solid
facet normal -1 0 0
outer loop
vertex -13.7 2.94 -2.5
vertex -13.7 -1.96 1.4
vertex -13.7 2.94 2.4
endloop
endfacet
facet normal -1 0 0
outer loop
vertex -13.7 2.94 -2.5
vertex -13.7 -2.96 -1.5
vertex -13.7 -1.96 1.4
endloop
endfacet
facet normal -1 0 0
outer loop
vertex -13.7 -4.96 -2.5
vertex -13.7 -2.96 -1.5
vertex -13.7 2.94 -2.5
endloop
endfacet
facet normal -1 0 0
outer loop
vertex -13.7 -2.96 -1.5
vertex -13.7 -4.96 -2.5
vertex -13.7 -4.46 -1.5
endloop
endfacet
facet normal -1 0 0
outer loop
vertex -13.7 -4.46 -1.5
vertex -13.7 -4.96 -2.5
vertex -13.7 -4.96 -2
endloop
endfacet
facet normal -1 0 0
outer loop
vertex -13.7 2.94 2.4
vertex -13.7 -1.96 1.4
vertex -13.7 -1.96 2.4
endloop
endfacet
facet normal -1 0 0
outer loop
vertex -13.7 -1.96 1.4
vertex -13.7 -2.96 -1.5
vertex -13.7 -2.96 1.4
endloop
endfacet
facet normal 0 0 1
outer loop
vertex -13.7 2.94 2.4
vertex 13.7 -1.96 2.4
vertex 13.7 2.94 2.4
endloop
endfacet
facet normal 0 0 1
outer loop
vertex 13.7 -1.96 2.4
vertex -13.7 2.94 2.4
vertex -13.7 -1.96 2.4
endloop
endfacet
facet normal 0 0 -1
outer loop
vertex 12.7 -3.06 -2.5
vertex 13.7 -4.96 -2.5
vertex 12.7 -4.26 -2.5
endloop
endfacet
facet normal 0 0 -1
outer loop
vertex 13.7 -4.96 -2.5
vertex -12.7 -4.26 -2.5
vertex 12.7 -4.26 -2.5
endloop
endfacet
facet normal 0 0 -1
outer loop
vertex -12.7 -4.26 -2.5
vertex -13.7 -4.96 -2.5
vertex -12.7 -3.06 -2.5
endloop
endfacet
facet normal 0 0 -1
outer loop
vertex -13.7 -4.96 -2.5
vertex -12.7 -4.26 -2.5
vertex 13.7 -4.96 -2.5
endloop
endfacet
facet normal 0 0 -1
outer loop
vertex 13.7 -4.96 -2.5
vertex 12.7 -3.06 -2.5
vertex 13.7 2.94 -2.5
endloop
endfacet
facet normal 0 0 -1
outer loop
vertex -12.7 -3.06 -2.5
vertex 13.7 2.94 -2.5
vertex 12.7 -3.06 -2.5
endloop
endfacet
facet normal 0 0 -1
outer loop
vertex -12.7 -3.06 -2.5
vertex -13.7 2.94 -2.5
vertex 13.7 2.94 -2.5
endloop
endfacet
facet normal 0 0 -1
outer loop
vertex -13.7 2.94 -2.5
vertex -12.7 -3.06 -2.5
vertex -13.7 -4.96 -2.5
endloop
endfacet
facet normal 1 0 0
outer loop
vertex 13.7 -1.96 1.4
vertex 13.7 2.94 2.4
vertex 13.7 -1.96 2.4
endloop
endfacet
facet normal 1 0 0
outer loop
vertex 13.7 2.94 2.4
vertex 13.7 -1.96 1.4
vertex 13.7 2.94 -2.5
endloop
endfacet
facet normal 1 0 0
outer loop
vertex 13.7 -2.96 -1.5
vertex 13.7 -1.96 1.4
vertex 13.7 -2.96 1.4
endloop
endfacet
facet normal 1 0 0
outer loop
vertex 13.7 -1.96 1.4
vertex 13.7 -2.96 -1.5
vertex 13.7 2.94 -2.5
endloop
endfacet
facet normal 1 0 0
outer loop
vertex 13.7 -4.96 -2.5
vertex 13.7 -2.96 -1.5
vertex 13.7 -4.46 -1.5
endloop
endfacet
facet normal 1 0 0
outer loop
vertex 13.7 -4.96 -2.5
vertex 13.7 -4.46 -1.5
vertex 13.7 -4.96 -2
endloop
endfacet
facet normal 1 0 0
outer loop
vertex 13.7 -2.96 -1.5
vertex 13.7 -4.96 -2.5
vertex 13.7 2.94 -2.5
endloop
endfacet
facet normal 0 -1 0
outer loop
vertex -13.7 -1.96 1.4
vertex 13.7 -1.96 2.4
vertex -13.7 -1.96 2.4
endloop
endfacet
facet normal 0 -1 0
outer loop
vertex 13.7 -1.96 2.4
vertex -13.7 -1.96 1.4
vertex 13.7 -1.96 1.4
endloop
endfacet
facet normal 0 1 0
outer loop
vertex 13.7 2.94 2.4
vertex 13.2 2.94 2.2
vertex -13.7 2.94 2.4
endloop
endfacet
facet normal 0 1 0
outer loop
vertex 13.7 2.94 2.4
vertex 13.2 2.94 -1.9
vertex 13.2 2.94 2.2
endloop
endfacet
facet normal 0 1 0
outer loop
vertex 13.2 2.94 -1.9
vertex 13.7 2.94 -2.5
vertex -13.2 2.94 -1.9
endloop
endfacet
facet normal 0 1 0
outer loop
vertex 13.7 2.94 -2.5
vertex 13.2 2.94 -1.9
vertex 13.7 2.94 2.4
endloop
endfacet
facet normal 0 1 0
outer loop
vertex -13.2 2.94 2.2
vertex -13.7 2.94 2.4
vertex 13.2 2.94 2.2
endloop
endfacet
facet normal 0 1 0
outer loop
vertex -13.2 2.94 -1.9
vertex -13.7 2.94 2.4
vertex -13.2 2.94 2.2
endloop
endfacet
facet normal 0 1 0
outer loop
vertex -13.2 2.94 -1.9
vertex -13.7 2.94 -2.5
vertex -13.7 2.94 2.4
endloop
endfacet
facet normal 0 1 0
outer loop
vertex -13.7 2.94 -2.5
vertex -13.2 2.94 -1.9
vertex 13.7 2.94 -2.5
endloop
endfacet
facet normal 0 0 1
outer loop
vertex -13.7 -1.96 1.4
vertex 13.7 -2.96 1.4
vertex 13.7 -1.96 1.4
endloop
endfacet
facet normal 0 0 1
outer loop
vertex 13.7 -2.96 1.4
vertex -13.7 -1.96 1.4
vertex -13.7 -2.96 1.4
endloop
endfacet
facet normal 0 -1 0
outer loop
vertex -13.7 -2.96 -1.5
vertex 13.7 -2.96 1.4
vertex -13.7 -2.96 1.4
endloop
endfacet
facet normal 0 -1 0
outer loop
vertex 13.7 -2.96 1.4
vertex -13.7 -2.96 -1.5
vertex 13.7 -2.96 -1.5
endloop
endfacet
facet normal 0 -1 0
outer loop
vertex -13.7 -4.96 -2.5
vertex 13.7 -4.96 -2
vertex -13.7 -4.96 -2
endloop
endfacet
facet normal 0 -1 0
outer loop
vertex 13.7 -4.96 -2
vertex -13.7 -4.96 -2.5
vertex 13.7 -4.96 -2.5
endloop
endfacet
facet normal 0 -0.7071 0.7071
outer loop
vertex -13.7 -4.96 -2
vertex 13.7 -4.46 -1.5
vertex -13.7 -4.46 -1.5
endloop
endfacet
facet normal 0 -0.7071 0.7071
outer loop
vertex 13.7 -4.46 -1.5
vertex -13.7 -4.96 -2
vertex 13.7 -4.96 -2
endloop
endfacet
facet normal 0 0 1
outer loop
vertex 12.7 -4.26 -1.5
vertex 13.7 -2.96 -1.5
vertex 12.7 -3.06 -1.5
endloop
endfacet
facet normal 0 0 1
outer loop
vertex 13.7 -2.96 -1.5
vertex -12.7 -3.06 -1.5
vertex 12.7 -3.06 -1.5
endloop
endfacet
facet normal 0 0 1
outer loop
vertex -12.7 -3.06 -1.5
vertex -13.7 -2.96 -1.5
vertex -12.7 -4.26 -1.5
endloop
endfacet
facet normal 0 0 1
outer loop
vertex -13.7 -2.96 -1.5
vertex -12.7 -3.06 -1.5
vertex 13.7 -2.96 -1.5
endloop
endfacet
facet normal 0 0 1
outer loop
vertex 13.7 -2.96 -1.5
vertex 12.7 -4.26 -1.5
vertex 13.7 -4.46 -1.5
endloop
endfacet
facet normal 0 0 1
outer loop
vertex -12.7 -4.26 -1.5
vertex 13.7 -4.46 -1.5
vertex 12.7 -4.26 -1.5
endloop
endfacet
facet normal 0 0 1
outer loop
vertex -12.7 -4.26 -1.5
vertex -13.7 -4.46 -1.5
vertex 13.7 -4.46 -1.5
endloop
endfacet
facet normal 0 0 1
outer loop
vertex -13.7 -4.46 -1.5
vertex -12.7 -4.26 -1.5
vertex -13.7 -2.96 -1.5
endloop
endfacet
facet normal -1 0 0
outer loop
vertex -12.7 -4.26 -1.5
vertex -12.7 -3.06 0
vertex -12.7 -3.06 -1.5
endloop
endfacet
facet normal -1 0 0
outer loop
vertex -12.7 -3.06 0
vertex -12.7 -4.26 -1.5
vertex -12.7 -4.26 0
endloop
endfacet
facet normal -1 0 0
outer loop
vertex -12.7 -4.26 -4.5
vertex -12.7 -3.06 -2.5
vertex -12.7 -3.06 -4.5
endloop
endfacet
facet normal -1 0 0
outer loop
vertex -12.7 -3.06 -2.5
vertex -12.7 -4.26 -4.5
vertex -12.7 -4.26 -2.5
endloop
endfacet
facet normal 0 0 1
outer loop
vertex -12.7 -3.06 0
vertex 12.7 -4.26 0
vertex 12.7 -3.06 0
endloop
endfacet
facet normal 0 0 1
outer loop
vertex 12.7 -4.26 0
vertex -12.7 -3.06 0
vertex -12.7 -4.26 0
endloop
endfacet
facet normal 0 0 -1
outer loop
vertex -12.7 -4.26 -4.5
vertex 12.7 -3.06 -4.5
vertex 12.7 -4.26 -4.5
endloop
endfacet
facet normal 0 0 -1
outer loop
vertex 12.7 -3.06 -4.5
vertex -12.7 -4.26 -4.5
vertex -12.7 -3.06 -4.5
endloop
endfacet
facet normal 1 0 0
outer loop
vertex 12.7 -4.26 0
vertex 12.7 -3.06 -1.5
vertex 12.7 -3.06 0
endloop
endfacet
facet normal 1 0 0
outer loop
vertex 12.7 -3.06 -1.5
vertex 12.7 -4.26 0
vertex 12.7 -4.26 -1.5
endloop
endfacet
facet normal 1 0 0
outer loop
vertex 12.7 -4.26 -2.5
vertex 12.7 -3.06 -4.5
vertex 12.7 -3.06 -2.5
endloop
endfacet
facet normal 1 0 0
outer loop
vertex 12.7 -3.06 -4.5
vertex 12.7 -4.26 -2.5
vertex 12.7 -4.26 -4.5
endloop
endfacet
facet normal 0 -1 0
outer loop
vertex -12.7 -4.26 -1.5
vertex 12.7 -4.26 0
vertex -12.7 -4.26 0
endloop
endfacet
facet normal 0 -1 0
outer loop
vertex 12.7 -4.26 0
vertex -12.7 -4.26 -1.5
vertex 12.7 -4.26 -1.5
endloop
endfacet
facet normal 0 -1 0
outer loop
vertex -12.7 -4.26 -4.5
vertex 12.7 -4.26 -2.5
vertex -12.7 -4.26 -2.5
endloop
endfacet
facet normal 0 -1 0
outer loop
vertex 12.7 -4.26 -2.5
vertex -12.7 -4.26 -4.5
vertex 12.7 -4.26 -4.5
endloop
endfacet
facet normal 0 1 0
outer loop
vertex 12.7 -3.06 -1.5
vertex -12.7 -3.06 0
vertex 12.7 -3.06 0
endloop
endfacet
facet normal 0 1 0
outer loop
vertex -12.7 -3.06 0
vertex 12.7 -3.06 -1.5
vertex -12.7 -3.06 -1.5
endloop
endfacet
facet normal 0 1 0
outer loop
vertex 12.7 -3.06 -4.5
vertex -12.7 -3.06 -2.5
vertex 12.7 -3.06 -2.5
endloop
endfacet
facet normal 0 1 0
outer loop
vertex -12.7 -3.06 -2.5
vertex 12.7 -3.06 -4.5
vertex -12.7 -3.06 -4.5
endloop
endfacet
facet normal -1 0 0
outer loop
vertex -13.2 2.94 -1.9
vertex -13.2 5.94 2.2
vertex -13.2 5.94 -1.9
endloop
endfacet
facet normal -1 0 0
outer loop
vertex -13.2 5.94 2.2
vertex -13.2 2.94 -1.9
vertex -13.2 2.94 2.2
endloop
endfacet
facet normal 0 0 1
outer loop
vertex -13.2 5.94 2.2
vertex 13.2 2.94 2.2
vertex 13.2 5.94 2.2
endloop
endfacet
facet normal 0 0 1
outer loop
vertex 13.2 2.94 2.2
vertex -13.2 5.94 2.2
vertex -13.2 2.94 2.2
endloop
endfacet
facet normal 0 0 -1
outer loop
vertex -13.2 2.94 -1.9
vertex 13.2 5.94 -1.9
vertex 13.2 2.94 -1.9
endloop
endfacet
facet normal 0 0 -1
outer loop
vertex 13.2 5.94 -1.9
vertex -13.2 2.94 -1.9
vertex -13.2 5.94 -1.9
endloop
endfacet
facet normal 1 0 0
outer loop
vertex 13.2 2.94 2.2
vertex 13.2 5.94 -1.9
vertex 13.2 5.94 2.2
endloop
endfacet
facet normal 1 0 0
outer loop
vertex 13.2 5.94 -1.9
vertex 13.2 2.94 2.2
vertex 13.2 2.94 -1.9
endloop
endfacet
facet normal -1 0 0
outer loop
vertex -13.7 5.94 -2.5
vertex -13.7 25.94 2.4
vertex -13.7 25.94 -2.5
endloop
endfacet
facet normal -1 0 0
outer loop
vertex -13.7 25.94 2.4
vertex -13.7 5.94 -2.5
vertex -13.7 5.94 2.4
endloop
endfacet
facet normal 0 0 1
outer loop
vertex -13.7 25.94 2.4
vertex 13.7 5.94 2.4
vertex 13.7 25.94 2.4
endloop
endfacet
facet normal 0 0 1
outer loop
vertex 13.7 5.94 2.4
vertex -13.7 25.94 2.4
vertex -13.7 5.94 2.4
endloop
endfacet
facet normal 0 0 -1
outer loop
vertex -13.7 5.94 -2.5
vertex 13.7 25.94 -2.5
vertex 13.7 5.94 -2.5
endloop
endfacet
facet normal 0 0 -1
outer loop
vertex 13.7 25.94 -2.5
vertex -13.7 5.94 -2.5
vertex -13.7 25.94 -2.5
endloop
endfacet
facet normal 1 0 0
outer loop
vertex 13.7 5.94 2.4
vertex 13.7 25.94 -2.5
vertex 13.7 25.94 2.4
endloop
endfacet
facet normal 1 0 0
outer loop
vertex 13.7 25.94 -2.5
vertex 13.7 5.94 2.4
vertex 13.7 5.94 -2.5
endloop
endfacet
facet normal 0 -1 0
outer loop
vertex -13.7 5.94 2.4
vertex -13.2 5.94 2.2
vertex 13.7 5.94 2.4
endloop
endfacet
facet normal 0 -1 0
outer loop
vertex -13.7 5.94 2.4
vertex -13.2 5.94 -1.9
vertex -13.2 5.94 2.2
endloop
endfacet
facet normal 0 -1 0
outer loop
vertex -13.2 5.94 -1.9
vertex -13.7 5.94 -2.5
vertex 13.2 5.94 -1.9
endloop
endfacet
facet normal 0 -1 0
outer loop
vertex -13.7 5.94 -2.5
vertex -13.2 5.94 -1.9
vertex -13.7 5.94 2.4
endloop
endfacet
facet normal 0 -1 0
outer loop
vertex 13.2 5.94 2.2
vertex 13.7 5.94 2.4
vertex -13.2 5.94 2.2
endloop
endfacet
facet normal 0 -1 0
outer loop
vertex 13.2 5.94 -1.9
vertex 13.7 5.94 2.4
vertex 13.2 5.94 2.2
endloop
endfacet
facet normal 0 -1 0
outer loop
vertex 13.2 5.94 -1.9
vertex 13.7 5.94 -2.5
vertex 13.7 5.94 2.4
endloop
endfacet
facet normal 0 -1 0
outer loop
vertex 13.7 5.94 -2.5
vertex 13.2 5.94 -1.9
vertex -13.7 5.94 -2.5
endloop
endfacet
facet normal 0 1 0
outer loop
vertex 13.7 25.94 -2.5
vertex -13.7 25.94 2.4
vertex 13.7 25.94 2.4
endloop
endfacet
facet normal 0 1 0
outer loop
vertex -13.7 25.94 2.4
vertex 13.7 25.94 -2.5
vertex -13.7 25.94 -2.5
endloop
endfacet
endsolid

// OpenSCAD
N=10;
A=2.4+N*2.5;
rotate([0,0,180])
translate([-A/2,-2.94,-2.5])
{
	cube([A,4.9,4.9]);
	cube([A,5.9,3.9]);
	hull()
	{
		cube([A,7.4,1]);
		cube([A,7.9,0.5]);
	}
	translate([1,6,-2])cube([A-2,1.2,4.5]); // Assumes cropped pins
	// Plug
	translate([0.5,-20,0.6])cube([A-1,21,4.1]);
	translate([0,-23,0])cube([A,20,4.9]);
}
